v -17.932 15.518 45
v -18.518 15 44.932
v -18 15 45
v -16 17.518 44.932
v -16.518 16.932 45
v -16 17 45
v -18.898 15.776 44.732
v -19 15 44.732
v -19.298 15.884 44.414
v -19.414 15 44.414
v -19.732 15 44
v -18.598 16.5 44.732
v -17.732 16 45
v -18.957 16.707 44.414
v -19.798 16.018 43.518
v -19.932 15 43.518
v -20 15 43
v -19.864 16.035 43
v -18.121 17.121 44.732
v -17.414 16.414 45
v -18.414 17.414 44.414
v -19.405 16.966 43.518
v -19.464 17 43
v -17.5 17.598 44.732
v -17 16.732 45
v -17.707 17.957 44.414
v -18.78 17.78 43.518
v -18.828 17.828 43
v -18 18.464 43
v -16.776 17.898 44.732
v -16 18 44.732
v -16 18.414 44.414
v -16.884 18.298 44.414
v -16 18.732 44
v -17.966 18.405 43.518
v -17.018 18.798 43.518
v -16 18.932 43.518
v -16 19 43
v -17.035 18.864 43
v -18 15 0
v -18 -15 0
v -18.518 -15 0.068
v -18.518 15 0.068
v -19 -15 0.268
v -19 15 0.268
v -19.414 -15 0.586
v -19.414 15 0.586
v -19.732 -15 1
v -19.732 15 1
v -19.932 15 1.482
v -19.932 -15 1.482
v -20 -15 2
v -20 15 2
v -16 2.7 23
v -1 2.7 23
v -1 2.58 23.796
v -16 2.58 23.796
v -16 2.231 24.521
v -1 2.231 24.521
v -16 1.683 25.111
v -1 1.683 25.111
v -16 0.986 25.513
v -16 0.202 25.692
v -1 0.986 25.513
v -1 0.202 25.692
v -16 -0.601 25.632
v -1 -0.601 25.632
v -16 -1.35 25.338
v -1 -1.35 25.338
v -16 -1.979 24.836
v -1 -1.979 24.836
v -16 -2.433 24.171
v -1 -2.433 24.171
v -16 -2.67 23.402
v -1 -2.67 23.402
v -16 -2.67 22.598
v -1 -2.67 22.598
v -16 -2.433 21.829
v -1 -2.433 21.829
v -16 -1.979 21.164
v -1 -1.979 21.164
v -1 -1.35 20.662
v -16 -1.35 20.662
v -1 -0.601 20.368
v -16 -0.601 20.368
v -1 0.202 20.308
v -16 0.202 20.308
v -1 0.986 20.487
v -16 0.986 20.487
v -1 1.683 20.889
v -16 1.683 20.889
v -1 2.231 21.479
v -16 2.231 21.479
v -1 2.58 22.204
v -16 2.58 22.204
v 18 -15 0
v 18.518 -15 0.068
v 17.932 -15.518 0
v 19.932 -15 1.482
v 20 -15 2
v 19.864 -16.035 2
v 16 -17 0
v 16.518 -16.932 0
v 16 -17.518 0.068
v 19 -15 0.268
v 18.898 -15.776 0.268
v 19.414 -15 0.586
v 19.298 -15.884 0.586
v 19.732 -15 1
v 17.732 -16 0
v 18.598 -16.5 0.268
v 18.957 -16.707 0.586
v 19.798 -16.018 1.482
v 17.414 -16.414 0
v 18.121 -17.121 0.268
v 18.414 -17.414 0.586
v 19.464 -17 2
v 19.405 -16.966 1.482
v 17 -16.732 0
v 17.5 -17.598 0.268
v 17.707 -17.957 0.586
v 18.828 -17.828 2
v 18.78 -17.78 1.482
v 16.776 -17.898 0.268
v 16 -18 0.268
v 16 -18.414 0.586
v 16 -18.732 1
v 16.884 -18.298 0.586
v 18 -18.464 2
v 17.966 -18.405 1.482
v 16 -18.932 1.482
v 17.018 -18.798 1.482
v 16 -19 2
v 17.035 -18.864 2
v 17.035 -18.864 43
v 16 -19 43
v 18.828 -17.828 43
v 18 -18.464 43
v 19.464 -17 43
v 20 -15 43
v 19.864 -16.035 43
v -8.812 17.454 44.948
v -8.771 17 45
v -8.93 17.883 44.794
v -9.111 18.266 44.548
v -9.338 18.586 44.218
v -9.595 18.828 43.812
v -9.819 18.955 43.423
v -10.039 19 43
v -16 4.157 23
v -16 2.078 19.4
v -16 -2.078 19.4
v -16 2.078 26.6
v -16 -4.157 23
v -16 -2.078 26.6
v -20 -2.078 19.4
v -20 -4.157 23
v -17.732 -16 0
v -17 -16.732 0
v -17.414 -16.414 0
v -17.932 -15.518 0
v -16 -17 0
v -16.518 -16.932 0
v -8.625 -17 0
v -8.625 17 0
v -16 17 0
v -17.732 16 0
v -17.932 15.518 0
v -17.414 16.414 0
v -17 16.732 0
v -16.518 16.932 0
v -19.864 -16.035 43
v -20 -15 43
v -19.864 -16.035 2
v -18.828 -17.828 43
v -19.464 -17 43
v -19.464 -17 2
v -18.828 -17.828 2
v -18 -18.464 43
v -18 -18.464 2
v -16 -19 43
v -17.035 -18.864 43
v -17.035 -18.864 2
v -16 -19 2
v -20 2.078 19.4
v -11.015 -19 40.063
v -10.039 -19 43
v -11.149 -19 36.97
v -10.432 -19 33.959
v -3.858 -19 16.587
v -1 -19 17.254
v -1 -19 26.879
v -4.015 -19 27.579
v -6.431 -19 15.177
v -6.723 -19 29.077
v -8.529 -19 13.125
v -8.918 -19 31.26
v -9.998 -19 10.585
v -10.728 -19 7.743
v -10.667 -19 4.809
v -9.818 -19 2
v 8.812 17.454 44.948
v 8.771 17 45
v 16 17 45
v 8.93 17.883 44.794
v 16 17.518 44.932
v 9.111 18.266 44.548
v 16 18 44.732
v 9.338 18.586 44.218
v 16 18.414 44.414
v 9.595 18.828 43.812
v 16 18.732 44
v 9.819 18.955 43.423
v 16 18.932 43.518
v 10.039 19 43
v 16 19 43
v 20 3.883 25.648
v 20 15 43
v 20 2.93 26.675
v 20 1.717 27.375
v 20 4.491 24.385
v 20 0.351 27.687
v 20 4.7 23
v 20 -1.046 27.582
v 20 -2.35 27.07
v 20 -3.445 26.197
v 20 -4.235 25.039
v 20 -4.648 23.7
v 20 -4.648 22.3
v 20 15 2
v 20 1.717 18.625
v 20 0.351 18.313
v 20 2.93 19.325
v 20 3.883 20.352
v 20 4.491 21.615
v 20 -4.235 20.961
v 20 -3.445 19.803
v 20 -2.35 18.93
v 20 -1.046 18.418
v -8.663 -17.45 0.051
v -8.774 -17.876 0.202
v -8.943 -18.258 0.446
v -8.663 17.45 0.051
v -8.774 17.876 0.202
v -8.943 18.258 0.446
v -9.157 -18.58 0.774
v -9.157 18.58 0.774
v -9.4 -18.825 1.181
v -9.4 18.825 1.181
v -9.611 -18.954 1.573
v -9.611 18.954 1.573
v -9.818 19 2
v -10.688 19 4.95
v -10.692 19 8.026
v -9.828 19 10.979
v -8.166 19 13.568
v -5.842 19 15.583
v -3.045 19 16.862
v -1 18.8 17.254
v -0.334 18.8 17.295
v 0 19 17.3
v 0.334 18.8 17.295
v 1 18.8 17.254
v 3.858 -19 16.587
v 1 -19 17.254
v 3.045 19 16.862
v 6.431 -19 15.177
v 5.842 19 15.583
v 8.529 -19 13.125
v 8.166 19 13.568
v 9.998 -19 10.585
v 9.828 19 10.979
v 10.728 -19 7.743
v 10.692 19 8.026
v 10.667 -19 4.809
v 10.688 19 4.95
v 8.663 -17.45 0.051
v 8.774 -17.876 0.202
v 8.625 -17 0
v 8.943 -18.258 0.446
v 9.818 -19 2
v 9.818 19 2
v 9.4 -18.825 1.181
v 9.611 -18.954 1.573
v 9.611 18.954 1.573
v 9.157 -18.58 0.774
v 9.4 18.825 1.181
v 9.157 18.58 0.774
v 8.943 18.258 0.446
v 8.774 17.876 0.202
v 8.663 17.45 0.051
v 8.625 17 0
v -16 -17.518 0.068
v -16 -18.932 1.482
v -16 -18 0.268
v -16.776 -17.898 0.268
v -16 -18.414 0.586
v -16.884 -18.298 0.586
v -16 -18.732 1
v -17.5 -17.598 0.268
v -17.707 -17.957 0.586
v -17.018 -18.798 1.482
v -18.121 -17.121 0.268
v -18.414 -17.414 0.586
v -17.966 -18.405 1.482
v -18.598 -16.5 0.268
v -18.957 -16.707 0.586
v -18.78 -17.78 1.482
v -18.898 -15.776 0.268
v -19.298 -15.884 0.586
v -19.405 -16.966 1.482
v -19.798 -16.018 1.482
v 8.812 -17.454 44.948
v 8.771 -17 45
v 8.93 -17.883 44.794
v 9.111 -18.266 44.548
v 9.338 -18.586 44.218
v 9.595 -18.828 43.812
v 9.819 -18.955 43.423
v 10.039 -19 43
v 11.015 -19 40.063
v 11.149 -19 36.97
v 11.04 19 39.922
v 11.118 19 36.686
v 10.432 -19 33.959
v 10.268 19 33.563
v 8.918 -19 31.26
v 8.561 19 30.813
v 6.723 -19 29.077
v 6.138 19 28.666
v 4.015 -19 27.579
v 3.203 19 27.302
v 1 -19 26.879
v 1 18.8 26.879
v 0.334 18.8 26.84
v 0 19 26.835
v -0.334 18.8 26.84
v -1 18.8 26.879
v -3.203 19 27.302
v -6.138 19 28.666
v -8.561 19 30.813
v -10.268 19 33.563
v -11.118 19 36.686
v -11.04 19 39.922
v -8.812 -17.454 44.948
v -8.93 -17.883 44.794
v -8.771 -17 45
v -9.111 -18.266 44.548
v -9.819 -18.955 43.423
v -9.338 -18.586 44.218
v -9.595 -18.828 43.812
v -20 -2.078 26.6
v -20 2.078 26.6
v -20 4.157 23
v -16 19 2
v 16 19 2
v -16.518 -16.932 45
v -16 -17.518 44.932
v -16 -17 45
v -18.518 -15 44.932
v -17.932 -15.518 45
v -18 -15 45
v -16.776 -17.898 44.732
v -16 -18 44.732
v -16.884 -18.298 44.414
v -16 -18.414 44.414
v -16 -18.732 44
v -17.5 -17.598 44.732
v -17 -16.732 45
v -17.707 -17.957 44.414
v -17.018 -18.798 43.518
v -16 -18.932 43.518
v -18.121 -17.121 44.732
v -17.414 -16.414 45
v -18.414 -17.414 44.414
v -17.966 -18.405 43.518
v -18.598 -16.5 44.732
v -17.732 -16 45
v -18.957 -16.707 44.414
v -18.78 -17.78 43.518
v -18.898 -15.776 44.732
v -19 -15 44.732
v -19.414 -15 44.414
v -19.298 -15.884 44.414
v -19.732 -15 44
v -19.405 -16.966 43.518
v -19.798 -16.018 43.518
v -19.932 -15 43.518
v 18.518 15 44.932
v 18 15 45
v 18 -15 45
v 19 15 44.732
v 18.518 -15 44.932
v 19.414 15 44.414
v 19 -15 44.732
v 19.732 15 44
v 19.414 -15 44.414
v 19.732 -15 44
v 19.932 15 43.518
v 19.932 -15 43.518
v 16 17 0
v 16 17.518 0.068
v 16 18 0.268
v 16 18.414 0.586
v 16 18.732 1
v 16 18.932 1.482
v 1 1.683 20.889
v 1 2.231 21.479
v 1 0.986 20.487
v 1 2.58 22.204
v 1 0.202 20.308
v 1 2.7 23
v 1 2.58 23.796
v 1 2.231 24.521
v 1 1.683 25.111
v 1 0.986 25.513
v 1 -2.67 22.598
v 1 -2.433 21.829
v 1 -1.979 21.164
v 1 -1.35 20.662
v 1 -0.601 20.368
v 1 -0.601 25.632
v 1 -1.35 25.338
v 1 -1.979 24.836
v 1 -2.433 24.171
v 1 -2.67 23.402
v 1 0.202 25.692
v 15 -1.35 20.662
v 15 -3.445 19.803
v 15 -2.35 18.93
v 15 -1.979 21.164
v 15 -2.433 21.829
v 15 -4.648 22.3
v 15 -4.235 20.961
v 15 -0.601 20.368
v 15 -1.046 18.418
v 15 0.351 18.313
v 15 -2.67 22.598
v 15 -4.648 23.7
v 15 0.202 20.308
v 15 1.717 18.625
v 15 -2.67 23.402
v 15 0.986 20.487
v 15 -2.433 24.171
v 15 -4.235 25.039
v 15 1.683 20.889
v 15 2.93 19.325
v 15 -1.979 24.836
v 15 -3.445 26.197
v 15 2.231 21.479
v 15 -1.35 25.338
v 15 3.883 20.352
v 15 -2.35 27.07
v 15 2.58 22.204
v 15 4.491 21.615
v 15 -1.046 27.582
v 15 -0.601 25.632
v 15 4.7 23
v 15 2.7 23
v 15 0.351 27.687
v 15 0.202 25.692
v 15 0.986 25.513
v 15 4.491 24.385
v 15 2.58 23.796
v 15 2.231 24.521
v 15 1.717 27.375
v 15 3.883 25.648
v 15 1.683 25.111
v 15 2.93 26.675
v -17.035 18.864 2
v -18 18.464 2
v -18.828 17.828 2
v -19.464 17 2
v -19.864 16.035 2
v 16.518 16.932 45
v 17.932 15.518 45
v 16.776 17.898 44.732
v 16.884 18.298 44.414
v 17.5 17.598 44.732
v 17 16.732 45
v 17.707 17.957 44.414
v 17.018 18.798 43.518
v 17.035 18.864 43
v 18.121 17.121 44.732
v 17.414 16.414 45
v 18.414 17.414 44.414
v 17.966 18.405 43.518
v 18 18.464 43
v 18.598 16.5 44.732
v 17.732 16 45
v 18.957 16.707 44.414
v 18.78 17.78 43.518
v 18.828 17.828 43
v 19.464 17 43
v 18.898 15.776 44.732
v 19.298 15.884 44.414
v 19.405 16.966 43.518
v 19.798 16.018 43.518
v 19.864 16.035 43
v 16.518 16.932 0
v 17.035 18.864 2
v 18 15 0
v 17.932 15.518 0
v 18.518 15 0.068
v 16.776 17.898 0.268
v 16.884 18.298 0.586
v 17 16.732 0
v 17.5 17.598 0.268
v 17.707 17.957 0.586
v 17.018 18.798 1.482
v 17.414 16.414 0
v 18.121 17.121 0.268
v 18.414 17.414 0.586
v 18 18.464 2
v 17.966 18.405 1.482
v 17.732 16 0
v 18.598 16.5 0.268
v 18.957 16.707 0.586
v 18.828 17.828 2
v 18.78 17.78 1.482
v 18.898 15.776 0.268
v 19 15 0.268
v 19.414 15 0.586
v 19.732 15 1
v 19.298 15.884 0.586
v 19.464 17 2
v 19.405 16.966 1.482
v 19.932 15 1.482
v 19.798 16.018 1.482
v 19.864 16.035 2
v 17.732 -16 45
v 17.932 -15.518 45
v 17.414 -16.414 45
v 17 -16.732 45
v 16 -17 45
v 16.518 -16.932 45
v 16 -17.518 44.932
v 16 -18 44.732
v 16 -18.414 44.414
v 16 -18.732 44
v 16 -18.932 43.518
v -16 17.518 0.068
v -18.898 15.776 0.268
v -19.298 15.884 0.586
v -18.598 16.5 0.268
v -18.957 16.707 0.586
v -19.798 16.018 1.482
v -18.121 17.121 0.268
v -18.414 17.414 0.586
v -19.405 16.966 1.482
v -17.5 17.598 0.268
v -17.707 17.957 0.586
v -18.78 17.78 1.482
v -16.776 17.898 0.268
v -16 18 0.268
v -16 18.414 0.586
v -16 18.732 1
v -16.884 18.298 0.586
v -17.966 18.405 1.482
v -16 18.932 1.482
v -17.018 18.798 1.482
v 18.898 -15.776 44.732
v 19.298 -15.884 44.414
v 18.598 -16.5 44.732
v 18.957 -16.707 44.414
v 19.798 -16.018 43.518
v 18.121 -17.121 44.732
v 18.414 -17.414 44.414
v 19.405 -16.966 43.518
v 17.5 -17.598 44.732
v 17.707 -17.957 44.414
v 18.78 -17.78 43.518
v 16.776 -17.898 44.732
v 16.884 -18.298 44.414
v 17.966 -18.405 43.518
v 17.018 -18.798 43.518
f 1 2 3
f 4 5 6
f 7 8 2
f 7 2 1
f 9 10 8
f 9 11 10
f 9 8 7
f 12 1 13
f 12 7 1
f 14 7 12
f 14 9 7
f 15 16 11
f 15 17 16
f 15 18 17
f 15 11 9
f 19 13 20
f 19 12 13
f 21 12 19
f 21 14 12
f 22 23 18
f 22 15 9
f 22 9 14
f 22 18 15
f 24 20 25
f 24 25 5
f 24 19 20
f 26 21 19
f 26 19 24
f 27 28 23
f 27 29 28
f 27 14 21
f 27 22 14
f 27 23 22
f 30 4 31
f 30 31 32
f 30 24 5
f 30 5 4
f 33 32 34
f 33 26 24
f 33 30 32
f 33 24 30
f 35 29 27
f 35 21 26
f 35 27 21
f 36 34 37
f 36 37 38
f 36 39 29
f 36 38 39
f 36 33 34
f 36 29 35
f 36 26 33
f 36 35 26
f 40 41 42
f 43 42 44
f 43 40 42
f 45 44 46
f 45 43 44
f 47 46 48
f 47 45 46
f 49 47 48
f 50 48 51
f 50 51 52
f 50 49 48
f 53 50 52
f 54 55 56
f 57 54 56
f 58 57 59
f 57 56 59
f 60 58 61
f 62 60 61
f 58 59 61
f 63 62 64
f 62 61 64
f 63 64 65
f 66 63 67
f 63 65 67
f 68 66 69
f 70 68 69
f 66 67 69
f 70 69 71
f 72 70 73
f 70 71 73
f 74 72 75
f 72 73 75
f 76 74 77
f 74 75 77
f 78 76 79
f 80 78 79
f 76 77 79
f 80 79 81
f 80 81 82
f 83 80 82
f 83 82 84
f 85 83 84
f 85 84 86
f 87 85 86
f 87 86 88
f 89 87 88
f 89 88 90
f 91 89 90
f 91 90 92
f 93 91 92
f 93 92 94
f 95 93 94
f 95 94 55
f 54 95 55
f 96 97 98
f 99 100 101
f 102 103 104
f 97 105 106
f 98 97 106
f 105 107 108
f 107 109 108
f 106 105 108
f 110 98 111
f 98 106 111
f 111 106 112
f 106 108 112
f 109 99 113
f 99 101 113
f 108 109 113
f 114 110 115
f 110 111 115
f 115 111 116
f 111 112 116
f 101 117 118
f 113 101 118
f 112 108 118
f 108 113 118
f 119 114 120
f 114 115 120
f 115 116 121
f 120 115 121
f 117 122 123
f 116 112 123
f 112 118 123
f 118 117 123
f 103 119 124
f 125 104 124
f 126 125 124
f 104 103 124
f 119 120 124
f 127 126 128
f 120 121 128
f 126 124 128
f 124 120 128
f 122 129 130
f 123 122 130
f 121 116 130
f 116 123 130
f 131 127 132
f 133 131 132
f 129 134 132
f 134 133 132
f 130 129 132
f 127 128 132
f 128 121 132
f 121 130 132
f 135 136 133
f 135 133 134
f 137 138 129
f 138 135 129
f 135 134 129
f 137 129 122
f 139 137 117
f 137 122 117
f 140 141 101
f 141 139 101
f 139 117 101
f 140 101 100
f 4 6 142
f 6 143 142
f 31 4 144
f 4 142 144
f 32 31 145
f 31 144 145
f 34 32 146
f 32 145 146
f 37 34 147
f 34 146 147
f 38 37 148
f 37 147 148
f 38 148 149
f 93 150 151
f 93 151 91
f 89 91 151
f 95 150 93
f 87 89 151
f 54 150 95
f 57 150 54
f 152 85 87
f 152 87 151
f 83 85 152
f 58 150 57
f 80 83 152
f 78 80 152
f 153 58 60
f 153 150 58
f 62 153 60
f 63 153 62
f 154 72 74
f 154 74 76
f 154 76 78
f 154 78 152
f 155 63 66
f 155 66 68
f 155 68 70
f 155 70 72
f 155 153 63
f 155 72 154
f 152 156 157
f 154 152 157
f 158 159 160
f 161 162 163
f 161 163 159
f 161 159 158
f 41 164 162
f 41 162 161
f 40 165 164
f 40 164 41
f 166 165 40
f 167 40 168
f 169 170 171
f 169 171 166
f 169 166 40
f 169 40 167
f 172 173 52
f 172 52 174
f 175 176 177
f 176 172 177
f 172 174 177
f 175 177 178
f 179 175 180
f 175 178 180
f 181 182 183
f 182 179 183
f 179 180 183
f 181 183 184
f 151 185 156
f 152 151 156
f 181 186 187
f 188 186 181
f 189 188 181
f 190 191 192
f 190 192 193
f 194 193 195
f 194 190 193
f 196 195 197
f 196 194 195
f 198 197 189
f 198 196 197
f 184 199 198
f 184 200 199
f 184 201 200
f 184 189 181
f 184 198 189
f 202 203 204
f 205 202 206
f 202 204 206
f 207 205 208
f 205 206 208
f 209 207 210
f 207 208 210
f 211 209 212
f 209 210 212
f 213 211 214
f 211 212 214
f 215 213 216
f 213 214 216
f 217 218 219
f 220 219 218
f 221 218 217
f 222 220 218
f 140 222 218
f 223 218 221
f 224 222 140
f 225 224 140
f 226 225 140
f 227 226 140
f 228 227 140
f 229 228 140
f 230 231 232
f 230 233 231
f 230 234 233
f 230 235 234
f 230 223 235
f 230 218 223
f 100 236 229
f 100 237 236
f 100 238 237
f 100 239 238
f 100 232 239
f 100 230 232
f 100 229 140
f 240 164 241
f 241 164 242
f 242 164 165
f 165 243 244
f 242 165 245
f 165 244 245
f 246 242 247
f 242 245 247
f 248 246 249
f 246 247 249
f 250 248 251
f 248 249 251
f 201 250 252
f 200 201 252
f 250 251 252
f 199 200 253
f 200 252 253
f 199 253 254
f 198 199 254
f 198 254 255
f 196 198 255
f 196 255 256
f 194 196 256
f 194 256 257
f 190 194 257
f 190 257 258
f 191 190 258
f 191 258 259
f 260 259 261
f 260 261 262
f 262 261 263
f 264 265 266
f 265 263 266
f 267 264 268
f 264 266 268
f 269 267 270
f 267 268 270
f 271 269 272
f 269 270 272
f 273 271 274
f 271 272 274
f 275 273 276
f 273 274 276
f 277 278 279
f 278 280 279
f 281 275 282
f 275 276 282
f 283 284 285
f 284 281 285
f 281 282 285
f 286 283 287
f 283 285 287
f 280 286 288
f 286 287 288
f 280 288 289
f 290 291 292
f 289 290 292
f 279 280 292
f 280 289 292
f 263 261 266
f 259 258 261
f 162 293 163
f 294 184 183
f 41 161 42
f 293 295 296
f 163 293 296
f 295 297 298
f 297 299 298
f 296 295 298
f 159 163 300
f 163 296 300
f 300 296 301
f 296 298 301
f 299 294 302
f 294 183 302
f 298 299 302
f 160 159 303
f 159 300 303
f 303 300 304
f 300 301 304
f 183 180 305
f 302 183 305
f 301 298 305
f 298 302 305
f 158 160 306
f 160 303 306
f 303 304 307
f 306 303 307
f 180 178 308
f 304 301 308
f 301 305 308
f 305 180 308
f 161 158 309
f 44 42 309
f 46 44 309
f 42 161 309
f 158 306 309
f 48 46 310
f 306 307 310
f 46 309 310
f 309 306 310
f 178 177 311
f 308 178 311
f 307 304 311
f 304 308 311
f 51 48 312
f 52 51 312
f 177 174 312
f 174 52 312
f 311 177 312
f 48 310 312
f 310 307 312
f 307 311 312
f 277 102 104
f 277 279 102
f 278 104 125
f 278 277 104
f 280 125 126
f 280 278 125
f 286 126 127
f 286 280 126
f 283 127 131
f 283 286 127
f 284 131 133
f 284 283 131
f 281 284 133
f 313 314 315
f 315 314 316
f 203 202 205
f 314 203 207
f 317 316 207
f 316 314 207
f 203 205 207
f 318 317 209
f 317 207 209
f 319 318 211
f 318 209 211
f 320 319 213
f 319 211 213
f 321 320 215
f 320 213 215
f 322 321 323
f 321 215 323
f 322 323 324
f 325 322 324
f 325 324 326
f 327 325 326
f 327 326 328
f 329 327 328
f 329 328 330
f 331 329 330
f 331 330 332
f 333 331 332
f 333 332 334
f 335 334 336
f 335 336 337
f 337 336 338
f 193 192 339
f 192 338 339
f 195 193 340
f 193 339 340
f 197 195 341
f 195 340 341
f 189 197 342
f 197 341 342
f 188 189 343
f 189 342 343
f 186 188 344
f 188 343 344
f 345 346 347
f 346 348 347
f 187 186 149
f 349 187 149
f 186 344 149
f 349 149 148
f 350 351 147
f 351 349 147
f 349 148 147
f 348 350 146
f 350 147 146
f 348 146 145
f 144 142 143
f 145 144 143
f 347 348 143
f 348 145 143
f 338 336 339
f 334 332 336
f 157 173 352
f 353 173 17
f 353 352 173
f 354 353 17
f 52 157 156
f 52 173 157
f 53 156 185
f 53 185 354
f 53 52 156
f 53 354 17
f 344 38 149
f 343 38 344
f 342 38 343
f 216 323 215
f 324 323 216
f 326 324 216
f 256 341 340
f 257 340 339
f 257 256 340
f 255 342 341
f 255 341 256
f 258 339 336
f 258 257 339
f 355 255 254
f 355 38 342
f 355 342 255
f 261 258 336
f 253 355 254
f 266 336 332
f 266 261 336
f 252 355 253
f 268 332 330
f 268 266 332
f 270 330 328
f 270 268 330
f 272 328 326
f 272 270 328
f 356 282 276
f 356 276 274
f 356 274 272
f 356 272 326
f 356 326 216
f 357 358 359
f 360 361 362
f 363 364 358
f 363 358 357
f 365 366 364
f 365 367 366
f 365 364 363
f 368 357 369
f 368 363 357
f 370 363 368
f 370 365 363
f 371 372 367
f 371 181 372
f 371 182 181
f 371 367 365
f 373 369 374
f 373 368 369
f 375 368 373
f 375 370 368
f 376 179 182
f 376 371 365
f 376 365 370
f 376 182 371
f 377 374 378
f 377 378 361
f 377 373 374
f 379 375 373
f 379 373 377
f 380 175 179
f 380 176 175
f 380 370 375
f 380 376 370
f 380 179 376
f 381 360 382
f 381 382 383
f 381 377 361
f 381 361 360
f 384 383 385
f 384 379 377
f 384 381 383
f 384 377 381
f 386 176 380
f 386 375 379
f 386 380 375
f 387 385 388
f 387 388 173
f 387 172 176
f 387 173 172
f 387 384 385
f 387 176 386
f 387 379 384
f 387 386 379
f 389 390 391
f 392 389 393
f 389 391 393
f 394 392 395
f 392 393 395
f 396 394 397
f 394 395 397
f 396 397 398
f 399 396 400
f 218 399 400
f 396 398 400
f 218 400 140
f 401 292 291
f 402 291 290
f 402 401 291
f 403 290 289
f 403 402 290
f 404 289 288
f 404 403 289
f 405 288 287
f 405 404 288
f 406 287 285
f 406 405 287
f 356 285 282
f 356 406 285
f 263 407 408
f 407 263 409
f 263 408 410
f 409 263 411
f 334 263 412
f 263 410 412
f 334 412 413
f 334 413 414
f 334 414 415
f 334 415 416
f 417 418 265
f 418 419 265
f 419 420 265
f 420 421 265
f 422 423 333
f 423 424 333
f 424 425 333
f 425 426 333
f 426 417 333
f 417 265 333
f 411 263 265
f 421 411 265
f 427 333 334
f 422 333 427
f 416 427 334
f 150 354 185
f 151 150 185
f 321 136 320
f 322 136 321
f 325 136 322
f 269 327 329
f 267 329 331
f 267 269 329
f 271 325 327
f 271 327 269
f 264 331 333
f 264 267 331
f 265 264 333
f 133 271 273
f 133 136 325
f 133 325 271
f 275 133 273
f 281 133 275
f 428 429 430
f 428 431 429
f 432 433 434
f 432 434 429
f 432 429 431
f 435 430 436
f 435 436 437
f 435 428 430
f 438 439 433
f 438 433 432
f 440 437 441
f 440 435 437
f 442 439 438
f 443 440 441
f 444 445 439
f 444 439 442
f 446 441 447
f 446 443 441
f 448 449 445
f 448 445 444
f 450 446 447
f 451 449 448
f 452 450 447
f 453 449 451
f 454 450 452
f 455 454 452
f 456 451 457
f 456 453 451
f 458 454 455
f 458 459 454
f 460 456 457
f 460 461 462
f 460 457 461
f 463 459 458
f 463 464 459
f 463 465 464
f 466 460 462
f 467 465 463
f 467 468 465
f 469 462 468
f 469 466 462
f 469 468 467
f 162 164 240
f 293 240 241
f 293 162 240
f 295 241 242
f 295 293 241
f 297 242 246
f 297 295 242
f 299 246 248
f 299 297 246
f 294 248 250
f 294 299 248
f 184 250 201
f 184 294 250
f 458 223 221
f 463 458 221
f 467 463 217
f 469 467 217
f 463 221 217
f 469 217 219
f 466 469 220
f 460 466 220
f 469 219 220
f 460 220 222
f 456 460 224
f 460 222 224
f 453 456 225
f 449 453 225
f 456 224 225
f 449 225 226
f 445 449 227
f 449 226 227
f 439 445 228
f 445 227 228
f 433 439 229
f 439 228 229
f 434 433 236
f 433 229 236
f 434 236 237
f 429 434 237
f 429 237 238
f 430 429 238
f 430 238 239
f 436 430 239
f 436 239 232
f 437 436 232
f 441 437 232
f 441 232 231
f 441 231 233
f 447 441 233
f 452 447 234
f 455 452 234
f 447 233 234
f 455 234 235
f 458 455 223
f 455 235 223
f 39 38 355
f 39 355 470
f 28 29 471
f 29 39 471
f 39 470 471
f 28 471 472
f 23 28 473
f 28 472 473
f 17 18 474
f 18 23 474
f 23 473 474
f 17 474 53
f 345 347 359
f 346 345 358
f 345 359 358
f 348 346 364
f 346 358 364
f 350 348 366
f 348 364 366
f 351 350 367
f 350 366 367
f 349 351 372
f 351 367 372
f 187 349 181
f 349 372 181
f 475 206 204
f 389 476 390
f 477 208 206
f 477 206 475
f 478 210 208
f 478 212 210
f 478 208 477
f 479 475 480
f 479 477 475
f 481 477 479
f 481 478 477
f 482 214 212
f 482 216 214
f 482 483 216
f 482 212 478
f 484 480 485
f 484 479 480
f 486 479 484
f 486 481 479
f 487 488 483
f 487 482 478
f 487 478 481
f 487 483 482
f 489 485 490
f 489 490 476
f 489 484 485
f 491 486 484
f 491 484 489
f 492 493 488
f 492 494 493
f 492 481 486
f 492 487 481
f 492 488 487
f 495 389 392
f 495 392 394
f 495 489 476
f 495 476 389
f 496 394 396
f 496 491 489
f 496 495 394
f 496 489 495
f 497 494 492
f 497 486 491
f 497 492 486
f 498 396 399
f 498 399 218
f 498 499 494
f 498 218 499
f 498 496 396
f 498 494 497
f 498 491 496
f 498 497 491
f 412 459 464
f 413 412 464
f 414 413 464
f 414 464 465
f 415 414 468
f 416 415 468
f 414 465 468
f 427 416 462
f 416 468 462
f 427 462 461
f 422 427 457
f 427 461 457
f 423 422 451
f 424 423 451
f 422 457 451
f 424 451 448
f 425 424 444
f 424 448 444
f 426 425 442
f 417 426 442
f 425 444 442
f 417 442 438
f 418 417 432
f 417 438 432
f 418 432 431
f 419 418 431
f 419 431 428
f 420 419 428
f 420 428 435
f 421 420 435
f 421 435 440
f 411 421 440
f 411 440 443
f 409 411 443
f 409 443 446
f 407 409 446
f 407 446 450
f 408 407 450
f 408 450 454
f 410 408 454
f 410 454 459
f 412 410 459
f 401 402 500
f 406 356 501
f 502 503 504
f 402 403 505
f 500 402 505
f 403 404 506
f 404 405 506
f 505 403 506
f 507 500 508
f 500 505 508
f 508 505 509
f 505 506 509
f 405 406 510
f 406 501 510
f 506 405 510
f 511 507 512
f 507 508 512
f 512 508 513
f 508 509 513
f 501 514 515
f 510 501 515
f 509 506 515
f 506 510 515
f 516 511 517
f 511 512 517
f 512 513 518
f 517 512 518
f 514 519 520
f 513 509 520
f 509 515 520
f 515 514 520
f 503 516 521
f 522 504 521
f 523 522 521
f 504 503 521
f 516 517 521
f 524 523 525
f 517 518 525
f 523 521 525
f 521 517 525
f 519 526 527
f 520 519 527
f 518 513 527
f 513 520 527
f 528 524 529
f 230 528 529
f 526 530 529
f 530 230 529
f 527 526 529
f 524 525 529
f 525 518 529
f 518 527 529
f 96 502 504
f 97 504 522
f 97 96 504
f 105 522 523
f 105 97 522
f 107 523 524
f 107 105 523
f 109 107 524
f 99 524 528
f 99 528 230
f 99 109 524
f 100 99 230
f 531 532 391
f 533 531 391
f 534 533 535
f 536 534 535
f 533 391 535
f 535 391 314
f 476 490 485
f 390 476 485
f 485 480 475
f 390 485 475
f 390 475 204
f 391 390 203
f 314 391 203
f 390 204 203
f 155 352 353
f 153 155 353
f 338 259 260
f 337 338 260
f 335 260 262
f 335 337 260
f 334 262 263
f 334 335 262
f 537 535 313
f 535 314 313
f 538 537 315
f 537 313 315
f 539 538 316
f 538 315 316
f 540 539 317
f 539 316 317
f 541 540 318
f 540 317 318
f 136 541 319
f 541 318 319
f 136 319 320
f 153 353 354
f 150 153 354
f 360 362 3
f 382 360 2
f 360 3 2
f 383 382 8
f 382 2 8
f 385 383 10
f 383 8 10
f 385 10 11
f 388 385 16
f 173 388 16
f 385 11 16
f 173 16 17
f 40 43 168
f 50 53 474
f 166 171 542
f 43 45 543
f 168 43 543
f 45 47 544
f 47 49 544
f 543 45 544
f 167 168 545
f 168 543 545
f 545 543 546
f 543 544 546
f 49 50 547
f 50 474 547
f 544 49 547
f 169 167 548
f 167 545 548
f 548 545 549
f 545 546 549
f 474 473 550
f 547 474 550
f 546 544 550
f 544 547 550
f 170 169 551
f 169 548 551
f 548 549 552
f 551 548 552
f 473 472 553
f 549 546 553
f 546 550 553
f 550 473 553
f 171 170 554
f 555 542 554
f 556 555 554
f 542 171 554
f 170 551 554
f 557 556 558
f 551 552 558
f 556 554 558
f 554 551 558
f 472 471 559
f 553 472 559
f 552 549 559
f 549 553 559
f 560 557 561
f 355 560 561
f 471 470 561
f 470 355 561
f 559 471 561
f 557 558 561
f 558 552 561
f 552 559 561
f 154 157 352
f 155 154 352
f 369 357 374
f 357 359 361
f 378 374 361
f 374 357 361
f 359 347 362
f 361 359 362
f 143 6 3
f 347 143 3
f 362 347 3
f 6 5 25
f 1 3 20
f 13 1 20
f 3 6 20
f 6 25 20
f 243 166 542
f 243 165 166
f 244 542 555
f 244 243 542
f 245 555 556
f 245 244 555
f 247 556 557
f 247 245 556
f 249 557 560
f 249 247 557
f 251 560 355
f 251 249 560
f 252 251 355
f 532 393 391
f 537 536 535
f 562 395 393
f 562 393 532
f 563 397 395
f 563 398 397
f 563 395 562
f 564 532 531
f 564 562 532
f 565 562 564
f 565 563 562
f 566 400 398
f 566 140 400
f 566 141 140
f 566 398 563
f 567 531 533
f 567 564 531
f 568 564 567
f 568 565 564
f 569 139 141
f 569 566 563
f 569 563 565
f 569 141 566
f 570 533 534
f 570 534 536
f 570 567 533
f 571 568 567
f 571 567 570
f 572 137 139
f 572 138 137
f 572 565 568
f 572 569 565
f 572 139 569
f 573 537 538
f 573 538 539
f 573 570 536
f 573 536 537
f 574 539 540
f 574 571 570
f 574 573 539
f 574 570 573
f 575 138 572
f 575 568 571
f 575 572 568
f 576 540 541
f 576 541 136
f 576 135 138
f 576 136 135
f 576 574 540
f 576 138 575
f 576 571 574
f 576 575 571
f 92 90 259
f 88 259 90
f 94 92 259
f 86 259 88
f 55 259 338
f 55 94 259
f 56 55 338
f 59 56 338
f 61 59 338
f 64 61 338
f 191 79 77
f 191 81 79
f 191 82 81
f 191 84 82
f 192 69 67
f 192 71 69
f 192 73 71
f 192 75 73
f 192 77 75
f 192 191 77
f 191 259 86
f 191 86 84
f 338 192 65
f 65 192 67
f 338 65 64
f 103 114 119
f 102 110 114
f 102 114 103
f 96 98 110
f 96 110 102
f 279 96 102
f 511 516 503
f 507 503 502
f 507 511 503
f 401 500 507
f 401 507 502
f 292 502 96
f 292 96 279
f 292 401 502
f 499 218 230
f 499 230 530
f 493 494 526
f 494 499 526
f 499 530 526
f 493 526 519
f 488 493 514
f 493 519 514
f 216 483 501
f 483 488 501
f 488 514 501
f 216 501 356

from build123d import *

# Parameters (mm, degrees)
PAD_DEPTH       = 45
SKETCH008_R     = 11.2
SKETCH008_R_2   = 10.8
POCKET_DEPTH    = 38.001
SKETCH009_R     = 2.7
POCKET001_DEPTH = 40.001
SKETCH010_R     = 4.7
POCKET002_DEPTH = 5
POCKET003_DEPTH = 4
SKETCH011_W     = 2
SKETCH011_H     = 32
POCKET004_DEPTH = 37.8
FILLET_R        = 2


with BuildPart() as part:
    # Sketch → Pad (new body)
    with BuildSketch(Plane.XY):
        with BuildLine():
            Line((-16, 19), (16, 19))
            ThreePointArc((20, 15), (18.828427, 17.828427), (16, 19))
            Line((20, 15), (20, -15))
            ThreePointArc((16, -19), (18.828427, -17.828427), (20, -15))
            Line((16, -19), (-16, -19))
            ThreePointArc((-20, -15), (-18.828427, -17.828427), (-16, -19))
            Line((-20, -15), (-20, 15))
            ThreePointArc((-16, 19), (-18.828427, 17.828427), (-20, 15))
        make_face()
    extrude(amount=PAD_DEPTH)

    # Sketch008 → Pocket (cut, through all)
    with BuildSketch(Plane(origin=(0, 19, 0), x_dir=(-1, 0, 0), z_dir=(0, 1, 0))):
        with Locations((0, 38.034691)):
            Circle(SKETCH008_R)
        with Locations((0, 6.5)):
            Circle(SKETCH008_R_2)
    extrude(amount=-POCKET_DEPTH, mode=Mode.SUBTRACT)

    # Sketch009 → Pocket001 (cut, through all)
    with BuildSketch(Plane.YZ.offset(20)):
        with Locations((0, 23)):
            Circle(SKETCH009_R)
    extrude(amount=-POCKET001_DEPTH, mode=Mode.SUBTRACT)

    # Sketch010 → Pocket002 (cut)
    with BuildSketch(Plane.YZ.offset(20)):
        with Locations((0, 23)):
            Circle(SKETCH010_R)
    extrude(amount=-POCKET002_DEPTH, mode=Mode.SUBTRACT)

    # Sketch002 → Pocket003 (cut)
    with BuildSketch(Plane(origin=(-20, 0, 0), x_dir=(0, -1, 0), z_dir=(-1, 0, 0))):
        Polygon((4.156922, 23), (2.078461, 26.6), (-2.078461, 26.6), (-4.156922, 23), (-2.078461, 19.4), (2.078461, 19.4), align=None)
    extrude(amount=-POCKET003_DEPTH, mode=Mode.SUBTRACT)

    # Sketch011 → Pocket004 (cut)
    with BuildSketch(Plane.XZ.offset(19)):
        with Locations((0, 16)):
            Rectangle(SKETCH011_W, SKETCH011_H)
    extrude(amount=-POCKET004_DEPTH, mode=Mode.SUBTRACT)

    # Fillet
    fillet_edges = [part.edges().sort_by_distance(p)[0] for p in [
        (20, 0, 0),
        (20, 0, 45),
        (-20, 0, 0),
        (-20, 0, 45),
    ]]
    fillet(fillet_edges, radius=FILLET_R)


solid = part.part
